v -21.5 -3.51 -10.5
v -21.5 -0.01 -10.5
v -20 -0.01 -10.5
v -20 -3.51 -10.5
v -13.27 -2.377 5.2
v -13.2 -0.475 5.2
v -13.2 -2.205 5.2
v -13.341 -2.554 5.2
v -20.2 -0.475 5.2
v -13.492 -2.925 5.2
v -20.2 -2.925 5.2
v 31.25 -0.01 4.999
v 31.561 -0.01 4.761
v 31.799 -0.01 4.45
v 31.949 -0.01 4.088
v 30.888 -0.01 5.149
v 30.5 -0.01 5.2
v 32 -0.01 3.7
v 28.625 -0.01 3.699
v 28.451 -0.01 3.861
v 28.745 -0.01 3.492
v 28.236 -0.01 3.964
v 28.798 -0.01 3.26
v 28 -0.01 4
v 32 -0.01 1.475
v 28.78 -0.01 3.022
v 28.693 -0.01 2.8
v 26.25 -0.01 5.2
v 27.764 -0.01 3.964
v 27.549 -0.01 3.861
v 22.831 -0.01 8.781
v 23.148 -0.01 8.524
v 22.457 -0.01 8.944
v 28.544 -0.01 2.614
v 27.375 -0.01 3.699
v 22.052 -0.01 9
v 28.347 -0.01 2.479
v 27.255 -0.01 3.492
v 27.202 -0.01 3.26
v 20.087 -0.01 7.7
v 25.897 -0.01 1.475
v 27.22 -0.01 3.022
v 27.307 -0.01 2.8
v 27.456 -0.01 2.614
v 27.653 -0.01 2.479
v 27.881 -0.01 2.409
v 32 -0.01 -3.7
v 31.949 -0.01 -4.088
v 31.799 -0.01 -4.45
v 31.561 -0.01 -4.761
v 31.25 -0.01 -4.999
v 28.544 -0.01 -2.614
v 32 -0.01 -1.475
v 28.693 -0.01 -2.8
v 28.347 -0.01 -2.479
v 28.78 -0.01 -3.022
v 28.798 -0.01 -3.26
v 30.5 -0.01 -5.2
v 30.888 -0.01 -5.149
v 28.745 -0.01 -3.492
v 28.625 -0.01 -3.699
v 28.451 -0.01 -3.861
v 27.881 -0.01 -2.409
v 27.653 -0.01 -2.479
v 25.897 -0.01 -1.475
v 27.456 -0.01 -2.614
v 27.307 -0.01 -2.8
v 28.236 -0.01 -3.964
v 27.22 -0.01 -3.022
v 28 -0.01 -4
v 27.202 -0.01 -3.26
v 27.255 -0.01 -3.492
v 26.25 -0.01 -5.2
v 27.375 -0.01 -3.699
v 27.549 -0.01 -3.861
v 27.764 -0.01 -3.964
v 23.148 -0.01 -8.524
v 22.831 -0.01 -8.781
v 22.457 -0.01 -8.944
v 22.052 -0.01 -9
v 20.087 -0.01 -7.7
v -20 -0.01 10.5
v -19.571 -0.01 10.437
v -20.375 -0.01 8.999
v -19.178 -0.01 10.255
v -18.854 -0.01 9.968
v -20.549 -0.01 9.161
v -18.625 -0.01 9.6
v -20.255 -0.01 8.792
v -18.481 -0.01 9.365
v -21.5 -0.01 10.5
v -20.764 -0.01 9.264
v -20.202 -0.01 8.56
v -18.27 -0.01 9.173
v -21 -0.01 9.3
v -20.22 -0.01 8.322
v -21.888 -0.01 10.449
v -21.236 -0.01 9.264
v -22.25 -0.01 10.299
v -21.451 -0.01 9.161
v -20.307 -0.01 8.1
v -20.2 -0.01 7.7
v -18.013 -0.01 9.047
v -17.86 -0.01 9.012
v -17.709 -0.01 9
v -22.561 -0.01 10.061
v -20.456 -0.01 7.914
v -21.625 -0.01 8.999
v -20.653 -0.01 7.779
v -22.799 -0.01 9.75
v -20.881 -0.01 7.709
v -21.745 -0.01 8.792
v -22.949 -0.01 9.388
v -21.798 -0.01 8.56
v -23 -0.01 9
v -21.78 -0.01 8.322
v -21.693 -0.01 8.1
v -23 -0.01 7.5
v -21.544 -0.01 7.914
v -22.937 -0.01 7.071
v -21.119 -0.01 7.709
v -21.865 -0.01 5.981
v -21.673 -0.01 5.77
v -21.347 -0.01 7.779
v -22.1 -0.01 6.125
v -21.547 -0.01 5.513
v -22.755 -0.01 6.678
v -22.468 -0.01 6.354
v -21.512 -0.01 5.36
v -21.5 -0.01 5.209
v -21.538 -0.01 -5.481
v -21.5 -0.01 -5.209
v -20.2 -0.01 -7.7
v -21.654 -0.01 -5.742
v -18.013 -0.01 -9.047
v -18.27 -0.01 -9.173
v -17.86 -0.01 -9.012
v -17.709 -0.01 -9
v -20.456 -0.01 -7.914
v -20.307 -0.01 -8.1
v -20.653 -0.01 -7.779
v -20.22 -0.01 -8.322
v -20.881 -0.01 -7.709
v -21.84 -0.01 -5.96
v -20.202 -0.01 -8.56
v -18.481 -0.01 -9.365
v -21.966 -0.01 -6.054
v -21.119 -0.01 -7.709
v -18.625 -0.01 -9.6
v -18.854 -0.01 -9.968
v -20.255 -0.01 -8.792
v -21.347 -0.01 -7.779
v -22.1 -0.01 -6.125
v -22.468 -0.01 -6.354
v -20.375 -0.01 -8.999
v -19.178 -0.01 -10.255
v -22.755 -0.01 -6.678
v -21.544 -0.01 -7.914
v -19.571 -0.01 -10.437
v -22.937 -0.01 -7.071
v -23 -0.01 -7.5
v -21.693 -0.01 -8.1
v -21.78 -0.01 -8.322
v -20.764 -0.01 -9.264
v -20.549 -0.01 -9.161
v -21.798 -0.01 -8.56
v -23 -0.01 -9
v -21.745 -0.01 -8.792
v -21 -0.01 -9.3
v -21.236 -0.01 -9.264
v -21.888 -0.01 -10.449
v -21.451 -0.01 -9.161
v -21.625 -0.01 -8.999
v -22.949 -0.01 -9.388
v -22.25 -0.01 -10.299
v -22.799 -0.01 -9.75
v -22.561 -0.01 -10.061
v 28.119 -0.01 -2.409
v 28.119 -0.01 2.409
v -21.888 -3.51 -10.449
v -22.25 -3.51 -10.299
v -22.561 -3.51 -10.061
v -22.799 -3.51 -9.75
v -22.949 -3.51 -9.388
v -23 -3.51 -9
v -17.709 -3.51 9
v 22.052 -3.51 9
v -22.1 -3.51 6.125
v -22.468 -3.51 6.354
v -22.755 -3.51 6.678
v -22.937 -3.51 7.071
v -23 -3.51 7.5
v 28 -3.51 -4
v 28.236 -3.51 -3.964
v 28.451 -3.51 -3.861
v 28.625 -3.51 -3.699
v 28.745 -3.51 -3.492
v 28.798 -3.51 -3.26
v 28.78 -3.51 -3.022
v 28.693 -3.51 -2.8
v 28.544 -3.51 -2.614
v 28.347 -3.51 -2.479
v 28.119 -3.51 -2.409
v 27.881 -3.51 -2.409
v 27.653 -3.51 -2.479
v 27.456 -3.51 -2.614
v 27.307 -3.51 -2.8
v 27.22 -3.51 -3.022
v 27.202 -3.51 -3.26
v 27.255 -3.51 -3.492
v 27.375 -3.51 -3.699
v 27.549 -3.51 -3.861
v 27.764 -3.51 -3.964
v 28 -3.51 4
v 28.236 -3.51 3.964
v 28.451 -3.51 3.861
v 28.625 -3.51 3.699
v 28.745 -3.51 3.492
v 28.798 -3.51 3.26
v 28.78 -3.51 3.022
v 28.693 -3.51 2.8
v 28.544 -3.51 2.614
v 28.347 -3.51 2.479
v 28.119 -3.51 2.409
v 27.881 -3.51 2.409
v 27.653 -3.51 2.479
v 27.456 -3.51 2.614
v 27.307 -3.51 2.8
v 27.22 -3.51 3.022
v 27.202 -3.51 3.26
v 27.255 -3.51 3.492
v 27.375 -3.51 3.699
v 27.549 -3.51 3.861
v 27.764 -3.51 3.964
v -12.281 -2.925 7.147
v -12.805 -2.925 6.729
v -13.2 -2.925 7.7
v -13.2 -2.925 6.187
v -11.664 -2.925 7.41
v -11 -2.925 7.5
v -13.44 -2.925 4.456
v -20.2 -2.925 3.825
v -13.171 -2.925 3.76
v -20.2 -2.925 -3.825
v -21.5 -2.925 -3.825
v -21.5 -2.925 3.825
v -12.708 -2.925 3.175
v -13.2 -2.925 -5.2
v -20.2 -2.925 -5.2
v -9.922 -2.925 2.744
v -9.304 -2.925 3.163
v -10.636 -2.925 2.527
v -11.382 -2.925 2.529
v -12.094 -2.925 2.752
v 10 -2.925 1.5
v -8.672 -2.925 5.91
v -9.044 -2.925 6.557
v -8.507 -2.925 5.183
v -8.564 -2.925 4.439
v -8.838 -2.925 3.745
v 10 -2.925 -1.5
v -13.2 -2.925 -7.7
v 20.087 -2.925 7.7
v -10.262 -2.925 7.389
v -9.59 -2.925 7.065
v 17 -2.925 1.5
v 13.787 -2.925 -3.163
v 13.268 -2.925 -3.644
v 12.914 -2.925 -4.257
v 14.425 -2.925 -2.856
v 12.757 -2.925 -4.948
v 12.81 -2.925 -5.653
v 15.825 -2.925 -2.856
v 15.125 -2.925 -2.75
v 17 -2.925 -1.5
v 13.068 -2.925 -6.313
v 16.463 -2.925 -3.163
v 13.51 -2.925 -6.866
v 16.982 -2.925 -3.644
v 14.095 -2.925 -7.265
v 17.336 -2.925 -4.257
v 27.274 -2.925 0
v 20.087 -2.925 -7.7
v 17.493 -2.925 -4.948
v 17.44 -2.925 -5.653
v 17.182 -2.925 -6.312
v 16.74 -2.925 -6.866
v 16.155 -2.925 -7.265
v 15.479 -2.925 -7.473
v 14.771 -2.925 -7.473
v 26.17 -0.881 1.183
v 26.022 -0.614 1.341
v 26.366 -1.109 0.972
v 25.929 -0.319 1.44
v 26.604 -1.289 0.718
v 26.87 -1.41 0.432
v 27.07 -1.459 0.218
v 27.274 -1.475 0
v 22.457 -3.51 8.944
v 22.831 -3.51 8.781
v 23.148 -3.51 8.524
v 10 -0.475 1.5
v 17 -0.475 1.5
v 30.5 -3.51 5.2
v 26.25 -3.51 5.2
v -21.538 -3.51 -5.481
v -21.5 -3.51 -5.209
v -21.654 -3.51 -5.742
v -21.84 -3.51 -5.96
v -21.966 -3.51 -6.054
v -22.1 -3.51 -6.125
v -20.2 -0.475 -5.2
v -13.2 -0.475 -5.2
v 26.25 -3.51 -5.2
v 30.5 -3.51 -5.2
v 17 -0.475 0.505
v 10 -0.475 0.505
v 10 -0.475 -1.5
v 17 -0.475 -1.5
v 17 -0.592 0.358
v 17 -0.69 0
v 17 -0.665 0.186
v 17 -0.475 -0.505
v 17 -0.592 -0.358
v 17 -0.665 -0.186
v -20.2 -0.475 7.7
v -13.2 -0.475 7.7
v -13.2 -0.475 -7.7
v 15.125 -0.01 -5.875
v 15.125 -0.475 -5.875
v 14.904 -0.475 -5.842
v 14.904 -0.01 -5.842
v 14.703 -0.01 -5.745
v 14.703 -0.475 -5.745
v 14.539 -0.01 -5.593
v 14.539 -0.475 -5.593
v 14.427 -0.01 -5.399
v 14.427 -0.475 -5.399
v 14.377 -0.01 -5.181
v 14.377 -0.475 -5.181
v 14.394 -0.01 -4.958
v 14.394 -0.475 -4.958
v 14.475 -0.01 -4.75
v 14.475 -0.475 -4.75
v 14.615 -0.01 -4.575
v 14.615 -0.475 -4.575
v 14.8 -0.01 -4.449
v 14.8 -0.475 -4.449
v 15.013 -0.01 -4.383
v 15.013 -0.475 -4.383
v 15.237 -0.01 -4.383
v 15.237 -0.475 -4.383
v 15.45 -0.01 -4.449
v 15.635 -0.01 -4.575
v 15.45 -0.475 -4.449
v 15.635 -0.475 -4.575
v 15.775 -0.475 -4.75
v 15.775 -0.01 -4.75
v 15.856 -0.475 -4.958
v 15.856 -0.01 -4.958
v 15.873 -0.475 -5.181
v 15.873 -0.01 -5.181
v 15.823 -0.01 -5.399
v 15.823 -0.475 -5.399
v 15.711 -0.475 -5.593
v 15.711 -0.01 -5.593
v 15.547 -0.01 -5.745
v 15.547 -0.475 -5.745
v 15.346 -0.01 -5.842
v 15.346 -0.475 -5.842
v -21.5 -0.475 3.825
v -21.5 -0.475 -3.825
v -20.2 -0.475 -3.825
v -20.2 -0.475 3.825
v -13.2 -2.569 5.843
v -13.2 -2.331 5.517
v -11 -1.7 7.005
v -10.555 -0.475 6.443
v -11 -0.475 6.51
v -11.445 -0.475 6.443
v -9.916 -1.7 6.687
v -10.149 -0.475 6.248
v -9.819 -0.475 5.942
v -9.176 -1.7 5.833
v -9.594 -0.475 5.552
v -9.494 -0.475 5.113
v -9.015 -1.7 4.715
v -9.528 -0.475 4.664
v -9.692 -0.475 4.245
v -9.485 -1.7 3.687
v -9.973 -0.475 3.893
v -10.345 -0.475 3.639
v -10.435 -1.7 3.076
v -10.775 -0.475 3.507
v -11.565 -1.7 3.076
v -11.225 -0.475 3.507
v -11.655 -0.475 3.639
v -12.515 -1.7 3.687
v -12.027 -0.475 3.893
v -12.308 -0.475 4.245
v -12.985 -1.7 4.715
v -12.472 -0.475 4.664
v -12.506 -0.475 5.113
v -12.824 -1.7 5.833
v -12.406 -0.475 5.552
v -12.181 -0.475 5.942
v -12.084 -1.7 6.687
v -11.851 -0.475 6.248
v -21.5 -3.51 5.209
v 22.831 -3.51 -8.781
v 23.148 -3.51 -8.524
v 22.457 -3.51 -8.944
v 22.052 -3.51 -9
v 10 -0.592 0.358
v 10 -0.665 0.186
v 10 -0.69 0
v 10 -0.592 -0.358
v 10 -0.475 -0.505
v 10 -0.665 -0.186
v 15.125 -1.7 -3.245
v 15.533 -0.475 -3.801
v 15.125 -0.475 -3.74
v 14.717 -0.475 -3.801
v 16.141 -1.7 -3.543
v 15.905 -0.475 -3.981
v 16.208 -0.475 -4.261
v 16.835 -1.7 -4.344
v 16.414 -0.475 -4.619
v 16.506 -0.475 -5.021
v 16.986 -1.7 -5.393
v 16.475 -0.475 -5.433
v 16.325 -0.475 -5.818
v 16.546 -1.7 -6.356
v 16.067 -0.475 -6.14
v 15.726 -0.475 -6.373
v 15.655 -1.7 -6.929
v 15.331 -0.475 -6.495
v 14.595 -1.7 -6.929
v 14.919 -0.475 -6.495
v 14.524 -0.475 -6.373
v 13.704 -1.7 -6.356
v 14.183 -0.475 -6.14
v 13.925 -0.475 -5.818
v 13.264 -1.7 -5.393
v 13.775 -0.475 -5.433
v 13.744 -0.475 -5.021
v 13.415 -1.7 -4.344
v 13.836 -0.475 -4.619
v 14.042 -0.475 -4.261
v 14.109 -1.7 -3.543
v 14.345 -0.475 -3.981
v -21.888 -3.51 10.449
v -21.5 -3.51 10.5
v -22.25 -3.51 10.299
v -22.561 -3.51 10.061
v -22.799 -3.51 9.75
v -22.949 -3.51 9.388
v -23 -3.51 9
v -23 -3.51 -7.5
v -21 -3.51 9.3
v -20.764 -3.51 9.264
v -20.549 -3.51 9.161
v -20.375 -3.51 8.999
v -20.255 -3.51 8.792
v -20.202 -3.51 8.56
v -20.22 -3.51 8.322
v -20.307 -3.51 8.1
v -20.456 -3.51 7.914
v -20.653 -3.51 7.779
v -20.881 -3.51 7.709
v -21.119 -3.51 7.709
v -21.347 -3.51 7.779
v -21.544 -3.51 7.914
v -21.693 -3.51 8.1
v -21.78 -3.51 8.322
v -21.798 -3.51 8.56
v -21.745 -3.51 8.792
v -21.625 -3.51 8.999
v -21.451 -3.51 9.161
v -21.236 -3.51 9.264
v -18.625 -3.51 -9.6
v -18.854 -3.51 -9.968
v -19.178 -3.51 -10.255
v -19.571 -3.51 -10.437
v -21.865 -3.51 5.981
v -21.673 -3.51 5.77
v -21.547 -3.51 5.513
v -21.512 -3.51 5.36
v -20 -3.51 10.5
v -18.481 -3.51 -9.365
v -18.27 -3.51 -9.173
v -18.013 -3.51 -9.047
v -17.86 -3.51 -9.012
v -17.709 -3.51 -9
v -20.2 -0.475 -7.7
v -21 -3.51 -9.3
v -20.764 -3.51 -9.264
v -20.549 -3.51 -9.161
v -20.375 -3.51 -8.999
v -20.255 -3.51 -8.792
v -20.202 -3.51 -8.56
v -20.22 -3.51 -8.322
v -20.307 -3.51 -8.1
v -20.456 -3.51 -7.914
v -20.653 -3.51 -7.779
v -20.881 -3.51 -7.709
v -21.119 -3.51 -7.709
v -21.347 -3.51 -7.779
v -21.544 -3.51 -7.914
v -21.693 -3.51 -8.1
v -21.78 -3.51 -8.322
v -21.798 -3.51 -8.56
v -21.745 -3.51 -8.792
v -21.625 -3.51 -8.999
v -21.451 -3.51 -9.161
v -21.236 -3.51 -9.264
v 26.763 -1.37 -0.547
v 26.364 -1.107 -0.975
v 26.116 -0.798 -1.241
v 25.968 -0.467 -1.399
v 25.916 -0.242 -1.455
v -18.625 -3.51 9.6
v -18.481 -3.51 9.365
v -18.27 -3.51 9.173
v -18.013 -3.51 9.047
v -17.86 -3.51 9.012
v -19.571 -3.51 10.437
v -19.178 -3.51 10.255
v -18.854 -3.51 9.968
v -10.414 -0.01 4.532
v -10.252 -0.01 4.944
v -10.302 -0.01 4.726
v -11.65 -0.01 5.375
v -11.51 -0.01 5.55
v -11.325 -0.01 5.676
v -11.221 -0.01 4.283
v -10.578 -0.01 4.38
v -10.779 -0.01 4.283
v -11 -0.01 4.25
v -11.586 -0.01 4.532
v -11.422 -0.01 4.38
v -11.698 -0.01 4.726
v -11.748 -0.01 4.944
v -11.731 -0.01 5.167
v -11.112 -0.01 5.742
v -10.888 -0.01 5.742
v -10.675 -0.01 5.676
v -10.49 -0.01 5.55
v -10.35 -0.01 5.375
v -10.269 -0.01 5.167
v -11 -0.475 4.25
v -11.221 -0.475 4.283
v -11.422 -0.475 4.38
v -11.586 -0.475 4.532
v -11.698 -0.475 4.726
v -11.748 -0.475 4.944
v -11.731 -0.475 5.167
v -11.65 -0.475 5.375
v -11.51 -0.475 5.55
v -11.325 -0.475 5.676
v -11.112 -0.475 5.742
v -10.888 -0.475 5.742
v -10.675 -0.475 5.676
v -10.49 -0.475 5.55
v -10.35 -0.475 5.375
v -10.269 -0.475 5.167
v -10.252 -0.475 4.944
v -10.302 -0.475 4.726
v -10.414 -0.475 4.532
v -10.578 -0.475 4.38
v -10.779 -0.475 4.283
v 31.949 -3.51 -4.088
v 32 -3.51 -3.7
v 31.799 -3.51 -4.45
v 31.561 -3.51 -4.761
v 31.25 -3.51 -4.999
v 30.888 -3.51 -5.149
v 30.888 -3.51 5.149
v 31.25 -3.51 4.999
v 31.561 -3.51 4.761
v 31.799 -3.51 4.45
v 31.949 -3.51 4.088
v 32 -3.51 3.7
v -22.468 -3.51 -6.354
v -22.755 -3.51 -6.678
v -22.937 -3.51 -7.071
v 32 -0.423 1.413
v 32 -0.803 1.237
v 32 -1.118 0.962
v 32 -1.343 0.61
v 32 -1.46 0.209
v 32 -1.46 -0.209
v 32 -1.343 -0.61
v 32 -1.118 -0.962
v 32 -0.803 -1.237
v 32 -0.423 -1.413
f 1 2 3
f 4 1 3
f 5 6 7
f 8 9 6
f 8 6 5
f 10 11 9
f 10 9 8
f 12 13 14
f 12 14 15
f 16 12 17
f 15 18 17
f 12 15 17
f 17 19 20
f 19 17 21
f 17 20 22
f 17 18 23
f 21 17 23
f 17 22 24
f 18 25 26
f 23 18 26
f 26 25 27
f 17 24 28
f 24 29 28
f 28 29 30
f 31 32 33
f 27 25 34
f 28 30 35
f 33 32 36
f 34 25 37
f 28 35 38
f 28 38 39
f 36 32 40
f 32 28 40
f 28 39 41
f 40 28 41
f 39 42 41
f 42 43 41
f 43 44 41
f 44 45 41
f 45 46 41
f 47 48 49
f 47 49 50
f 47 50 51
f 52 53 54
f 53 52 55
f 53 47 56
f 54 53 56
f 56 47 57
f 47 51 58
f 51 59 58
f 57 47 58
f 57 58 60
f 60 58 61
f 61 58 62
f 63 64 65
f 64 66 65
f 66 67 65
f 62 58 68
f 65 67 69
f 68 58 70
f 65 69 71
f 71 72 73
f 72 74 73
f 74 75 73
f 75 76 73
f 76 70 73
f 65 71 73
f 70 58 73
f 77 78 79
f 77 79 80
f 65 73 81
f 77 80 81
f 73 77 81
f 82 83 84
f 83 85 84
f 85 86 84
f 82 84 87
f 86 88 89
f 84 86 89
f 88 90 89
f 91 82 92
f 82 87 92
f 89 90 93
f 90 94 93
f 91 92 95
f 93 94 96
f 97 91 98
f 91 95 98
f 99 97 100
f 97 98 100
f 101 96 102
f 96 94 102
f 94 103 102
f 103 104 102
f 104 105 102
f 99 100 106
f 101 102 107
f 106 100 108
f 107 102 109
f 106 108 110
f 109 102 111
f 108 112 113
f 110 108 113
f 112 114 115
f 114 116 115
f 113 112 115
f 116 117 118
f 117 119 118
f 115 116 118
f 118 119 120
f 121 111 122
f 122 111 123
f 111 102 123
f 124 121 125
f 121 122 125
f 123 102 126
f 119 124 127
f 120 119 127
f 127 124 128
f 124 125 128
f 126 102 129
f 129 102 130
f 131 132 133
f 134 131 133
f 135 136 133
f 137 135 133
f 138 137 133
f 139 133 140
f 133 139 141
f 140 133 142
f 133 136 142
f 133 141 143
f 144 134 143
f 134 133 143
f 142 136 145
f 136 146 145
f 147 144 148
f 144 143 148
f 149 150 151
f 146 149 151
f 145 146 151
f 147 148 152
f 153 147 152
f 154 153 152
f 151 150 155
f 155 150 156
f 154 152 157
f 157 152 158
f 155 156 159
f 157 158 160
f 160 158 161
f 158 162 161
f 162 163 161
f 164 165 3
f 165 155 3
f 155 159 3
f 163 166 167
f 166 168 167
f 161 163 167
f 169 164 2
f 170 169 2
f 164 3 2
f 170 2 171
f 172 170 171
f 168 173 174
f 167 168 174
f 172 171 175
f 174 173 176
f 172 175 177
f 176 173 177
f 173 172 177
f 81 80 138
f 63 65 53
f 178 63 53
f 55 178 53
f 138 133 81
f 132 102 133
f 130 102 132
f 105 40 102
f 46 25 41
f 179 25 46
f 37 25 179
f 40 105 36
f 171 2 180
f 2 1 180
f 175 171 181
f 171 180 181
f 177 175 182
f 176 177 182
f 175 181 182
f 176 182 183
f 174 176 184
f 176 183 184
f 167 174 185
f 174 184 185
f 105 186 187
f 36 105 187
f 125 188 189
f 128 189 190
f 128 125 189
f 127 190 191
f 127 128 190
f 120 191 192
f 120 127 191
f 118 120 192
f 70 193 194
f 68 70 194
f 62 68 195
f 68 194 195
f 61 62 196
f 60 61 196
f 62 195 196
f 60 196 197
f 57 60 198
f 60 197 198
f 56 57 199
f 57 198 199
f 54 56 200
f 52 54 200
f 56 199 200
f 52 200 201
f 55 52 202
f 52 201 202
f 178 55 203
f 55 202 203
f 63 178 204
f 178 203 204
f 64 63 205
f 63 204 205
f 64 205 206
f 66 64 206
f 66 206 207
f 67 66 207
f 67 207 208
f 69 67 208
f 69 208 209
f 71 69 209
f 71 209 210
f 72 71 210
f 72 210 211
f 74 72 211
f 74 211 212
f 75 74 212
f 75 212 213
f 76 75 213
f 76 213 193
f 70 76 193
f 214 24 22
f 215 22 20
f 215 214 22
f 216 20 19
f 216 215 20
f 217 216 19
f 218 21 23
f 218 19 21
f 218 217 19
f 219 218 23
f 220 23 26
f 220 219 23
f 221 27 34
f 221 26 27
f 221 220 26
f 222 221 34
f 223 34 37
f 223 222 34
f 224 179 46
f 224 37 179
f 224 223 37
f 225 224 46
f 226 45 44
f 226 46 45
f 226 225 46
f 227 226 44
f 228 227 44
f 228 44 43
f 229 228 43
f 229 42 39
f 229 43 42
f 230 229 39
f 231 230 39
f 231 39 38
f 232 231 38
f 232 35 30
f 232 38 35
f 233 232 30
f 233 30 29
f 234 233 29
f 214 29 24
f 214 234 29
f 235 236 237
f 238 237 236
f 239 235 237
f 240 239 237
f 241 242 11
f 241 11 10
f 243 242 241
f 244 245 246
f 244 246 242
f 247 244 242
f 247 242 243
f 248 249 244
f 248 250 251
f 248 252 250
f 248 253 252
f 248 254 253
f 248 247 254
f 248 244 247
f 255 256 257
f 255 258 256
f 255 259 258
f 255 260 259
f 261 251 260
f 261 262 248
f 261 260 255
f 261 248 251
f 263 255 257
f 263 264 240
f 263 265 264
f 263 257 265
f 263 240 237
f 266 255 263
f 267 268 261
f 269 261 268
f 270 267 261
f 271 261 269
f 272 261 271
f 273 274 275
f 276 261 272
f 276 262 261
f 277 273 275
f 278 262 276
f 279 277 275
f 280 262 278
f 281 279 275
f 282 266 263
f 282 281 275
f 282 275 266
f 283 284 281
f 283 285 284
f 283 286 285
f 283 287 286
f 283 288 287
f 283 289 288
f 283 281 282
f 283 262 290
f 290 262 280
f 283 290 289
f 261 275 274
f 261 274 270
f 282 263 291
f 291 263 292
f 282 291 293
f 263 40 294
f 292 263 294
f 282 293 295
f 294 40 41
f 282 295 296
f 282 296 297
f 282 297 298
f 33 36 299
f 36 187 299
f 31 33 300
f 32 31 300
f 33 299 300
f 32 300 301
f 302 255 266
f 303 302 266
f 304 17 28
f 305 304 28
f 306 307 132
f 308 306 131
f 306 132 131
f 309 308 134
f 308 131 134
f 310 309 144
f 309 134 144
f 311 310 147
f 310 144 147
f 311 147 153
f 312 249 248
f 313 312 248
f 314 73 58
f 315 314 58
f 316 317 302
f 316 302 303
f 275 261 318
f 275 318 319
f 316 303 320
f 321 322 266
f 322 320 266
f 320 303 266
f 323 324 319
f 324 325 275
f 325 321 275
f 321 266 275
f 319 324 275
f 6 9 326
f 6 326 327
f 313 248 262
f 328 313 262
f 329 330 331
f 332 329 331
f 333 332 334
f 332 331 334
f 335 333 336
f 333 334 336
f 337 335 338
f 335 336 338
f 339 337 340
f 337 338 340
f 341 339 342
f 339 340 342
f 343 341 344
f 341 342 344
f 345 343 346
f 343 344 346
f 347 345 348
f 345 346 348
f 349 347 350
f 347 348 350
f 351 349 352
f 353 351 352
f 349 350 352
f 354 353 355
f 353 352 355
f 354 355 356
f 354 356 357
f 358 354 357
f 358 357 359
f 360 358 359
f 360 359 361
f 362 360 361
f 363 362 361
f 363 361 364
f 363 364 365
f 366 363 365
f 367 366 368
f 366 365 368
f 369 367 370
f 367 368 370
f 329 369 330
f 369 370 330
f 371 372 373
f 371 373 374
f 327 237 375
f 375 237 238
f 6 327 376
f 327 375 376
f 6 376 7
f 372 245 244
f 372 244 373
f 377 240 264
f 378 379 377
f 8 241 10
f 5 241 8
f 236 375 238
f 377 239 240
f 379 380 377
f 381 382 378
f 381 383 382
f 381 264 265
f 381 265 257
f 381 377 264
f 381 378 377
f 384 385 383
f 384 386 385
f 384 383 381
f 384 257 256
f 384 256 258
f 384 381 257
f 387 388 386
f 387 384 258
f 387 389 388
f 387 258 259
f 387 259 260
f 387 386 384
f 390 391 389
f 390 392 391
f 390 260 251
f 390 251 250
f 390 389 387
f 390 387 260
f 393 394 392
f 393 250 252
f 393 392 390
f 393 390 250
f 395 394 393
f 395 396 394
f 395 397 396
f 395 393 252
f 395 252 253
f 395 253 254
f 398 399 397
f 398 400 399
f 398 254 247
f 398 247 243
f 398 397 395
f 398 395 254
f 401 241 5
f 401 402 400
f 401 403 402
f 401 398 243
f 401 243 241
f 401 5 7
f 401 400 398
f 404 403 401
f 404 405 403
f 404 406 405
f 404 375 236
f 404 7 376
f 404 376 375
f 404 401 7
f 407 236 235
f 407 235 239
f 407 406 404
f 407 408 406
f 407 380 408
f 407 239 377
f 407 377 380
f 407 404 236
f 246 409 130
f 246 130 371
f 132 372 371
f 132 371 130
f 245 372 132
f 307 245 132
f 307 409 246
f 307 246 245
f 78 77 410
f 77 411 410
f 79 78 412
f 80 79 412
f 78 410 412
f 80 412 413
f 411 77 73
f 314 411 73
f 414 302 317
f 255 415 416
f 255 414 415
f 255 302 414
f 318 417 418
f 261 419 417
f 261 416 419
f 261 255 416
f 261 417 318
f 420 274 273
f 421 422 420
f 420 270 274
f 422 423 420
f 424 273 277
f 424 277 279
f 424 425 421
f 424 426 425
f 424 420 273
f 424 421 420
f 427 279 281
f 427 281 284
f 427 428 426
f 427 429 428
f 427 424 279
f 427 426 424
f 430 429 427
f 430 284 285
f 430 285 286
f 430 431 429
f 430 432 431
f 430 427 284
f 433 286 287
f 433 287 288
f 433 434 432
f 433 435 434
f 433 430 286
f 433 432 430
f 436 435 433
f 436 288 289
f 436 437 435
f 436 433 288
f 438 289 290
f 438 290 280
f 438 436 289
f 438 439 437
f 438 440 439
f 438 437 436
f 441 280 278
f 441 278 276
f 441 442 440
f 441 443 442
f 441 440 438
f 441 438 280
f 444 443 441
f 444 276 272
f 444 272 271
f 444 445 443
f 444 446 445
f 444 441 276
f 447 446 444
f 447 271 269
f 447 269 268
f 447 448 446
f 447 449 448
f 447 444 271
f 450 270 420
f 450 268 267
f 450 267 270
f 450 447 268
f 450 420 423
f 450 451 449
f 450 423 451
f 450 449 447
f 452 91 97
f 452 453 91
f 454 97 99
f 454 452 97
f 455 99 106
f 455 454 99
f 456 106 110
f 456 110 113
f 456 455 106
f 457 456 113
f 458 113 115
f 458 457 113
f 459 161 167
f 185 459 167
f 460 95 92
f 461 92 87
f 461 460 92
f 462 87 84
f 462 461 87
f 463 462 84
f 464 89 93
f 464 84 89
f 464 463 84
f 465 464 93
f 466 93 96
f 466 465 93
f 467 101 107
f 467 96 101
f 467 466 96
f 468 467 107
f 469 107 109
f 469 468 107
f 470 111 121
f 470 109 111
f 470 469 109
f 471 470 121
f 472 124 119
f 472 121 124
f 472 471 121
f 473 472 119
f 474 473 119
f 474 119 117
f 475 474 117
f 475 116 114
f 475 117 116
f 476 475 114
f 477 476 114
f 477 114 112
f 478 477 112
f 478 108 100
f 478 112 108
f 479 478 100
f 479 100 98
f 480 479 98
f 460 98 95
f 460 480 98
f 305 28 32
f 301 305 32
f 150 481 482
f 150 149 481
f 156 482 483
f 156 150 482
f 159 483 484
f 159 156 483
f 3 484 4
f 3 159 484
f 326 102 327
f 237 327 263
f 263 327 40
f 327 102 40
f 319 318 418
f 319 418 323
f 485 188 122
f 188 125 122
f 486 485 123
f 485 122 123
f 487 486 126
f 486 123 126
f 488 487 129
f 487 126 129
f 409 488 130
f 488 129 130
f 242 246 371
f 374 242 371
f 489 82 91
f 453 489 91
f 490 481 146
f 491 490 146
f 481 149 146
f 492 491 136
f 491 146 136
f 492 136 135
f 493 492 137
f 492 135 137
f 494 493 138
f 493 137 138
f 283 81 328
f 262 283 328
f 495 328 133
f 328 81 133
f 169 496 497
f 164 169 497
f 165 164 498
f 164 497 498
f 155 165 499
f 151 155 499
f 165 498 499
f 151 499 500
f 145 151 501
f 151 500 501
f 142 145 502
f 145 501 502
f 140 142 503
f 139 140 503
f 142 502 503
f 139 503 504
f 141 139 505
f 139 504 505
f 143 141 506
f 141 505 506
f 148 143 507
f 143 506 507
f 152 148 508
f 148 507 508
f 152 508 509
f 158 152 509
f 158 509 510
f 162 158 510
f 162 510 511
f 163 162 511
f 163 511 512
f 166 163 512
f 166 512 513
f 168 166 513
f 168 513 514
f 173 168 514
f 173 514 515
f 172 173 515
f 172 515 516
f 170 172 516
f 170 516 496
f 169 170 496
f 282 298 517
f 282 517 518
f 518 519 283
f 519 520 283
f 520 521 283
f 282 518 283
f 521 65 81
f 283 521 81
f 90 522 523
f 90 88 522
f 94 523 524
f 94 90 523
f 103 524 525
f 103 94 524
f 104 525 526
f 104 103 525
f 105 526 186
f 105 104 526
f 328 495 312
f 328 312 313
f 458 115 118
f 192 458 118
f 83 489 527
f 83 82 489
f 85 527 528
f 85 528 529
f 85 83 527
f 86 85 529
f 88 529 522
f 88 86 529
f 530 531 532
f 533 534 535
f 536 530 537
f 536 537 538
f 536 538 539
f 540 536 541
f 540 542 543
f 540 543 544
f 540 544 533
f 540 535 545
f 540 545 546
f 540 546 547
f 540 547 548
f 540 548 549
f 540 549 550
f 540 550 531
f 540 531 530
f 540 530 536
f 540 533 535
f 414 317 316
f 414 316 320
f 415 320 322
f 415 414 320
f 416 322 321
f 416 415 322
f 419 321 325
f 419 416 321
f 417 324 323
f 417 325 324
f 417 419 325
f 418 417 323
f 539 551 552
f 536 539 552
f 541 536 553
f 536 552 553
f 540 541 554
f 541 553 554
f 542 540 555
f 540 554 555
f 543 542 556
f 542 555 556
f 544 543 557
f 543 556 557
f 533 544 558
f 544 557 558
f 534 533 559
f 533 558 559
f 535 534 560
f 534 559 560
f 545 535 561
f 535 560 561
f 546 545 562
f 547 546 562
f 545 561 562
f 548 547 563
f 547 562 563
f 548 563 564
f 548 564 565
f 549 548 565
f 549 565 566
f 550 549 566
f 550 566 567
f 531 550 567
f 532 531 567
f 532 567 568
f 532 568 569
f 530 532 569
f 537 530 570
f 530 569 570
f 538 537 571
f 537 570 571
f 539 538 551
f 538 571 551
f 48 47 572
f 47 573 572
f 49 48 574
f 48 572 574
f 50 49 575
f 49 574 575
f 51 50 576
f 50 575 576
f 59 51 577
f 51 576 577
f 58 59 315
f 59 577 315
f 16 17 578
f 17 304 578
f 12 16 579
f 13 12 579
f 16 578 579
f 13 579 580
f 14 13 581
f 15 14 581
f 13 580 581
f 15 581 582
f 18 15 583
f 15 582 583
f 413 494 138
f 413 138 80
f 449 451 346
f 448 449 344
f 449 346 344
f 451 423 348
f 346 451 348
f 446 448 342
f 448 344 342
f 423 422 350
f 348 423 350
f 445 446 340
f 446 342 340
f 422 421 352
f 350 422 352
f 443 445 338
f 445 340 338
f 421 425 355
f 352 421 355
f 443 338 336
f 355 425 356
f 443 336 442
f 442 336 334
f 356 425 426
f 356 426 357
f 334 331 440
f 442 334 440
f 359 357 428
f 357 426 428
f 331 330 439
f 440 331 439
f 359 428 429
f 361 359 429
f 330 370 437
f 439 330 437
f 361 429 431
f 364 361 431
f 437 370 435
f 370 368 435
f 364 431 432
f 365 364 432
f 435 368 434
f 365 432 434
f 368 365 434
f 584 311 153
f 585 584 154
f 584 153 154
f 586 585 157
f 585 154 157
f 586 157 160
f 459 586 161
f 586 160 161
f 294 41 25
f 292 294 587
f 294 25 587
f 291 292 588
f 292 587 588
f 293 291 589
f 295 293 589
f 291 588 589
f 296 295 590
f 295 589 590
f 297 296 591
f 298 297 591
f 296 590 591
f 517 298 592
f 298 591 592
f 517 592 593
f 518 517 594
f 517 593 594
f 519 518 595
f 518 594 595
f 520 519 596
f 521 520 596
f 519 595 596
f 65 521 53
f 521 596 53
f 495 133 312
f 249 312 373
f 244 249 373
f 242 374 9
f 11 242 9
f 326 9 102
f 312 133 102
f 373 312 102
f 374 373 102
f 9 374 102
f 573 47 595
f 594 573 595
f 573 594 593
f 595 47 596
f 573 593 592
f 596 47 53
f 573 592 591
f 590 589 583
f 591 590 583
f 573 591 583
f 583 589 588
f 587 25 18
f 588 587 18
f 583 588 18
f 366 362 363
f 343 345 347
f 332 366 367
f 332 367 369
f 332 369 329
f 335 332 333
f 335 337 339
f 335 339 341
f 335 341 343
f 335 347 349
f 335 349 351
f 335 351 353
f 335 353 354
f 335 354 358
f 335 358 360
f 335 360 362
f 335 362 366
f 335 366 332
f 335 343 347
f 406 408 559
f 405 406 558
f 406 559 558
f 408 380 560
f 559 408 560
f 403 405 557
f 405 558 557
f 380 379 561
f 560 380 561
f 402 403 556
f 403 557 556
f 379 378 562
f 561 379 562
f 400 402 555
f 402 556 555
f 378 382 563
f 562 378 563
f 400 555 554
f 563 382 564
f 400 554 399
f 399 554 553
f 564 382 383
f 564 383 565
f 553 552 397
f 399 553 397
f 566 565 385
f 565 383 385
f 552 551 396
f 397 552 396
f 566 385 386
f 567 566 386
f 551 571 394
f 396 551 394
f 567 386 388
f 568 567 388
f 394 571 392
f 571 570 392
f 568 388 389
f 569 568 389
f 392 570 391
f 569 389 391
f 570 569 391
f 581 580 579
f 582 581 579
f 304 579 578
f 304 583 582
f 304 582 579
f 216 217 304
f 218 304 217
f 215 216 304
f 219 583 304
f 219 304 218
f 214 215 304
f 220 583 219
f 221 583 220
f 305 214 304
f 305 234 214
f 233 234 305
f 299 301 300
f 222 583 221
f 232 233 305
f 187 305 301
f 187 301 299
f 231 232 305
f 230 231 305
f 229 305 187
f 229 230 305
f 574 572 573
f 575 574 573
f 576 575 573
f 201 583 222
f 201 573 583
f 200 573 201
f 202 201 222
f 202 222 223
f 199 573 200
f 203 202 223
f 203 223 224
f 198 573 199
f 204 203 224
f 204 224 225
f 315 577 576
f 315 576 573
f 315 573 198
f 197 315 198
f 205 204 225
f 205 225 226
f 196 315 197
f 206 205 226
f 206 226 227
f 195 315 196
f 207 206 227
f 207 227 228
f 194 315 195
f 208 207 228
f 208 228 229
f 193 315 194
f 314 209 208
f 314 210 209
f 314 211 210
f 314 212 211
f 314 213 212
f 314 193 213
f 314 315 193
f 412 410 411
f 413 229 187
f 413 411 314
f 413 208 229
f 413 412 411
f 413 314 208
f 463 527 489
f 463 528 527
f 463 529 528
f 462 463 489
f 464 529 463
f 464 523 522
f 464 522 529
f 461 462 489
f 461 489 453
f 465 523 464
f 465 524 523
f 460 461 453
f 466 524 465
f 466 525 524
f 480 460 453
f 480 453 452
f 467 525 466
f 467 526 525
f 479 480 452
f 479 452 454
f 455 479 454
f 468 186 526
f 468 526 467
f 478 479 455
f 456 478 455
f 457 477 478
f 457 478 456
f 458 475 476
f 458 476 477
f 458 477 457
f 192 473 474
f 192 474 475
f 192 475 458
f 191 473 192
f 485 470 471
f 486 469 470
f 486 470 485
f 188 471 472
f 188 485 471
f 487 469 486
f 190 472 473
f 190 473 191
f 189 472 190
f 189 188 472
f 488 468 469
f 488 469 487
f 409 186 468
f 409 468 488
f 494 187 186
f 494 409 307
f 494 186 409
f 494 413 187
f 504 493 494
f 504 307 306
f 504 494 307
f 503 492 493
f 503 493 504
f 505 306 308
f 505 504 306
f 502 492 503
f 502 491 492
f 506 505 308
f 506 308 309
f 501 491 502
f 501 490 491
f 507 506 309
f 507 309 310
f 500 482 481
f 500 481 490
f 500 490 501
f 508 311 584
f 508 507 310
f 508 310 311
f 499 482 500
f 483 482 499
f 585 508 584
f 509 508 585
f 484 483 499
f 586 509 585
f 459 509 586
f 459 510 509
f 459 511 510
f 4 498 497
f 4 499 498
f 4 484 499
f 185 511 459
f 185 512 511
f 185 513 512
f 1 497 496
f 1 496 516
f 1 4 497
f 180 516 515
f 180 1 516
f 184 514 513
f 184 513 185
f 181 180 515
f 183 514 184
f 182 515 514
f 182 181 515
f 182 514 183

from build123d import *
from OCP.BRepFilletAPI import BRepFilletAPI_MakeChamfer

# Parameters (mm, degrees)
BOSS_EXTRUDE1_START      = -0.01
BOSS_EXTRUDE1_DEPTH      = 3.5
CUT_EXTRUDE1_DEPTH       = 2.925
SKETCH5_R                = 1.5
SKETCH5_R_2              = 1.375
SKETCH5_W                = 7
SKETCH5_H                = 2.5
SKETCH5_H_2              = 3
BOSS_EXTRUDE2_DEPTH      = 2.45
CHAMFER1_SIZE            = 1
CHAMFER1_SIZE_2          = 2.475086853
SKETCH15_R               = 0.75
BOSS_EXTRUDE5_DEPTH      = 0.465
SKETCH7_W                = 7.65
SKETCH7_H                = 2.45
CUT_EXTRUDE2_DEPTH       = 3
BOSS_EXTRUDE3_START      = 0.01
BOSS_EXTRUDE3_DEPTH      = 3.465
CUT_EXTRUDE3_DEPTH       = 2.475
SKETCH10_R               = 1.5
SKETCH10_R_2             = 1.375
BOSS_EXTRUDE4_DEPTH      = 2
CHAMFER2_SIZE            = 0.5
CHAMFER2_SIZE_2          = 2
BOSS_EXTRUDE6_START      = 2.95
SKETCH10_3_R             = 0.75
BOSS_EXTRUDE6_DEPTH      = 2.95
SKETCH21_W               = 2
SKETCH21_H               = 15.4
BOSS_EXTRUDE7_DEPTH      = 2
CUT_EXTRUDE6_START       = -3.465
SKETCH16_R               = 1
CUT_EXTRUDE6_DEPTH       = 38.860351794
SKETCH19_R               = 0.8
CUT_EXTRUDE9_DEPTH       = 35.395351794
SKETCH17_R               = 1.85
CUT_EXTRUDE7_DEPTH       = 2
SKETCH12_W               = 5
SKETCH12_H               = 4.8
CUT_EXTRUDE4_DEPTH       = 1
SKETCH13_R               = 1.475
CUT_EXTRUDE5_DEPTH       = 11.91309
CUT_EXTRUDE10_START      = -23
CUT_EXTRUDE10_DEPTH      = 9
CUT_EXTRUDE10_START_2    = -13.91308954
CUT_EXTRUDE10_2_DEPTH    = 2
CUT_EXTRUDE11_DEPTH      = 35.395351794
CUT_EXTRUDE11_DEPTH_BACK = 35.395351794
SKETCH22_W               = 1.5
SKETCH22_H               = 12
SKETCH22_W_2             = 43.847191308
SKETCH22_H_2             = 1.5
FILLET1_R                = 1.5
FILLET2_R                = 1.5
FILLET3_R                = 1
FILLET4_R                = 1


with BuildPart() as part:
    # Sketch2 → Boss-Extrude1 (new body)
    with BuildSketch(Plane(origin=(0, 0, 0), x_dir=(1, 0, 0), z_dir=(0, 1, 0)).offset(BOSS_EXTRUDE1_START)):
        Polygon((-23, 10.5), (21.303656906, 10.5), (26.250323572, 5.2), (32, 5.2), (32, -5.2), (26.250323572, -5.2), (21.303656906, -10.5), (-23, -10.5), align=None)
    extrude(amount=-BOSS_EXTRUDE1_DEPTH)

    # Sketch3 → Cut-Extrude1 (cut)
    with BuildSketch(Plane(origin=(0, 0, 0), x_dir=(1, 0, 0), z_dir=(0, 1, 0))):
        Polygon((-20.2, 7.7), (-20.2, -7.7), (20.08691046, -7.7), (27.273577127, 0), (20.08691046, 7.7), align=None)
    extrude(amount=-CUT_EXTRUDE1_DEPTH, mode=Mode.SUBTRACT)

    # Sketch5 → Boss-Extrude2 (add)
    with BuildSketch(Plane(origin=(0, -2.925, 0), x_dir=(1, 0, 0), z_dir=(0, 1, 0))):
        with Locations(Location((-11, -5, 0), (0, 0, 270))):
            Circle(SKETCH5_R)
        with Locations(Location((15.125, 5.125, 0), (0, 0, 270))):
            Circle(SKETCH5_R_2)
        with Locations((-16.7, -6.45)):
            Rectangle(SKETCH5_W, SKETCH5_H)
        with Locations((-16.7, 6.45)):
            Rectangle(SKETCH5_W, SKETCH5_H)
        with Locations((13.5, 0)):
            Rectangle(SKETCH5_W, SKETCH5_H_2)
    extrude(amount=BOSS_EXTRUDE2_DEPTH)

    # Chamfer1
    # the kernel refuses this chamfer: 2.475086853, 1 mm, written as the material it adds along each edge
    with BuildSketch(Plane(origin=(-11, -2.925, 5), x_dir=(0, 0, 1), z_dir=(-1, 0, 0))) as chamfer1_piece_1_section:
        Polygon((1.5 + CHAMFER1_SIZE, 0), (1.5, CHAMFER1_SIZE_2), (1.5, 0), align=None)
    chamfer1_piece_1 = revolve(axis=Axis((-11, -2.925, 5), (0, 1, 0)), mode=Mode.PRIVATE)
    chamfer1_piece_1 = split(chamfer1_piece_1, bisect_by=Plane(origin=(-11, -0.475, 5), z_dir=(0, -1, 0)), keep=Keep.TOP, mode=Mode.PRIVATE)
    add(chamfer1_piece_1)
    with BuildSketch(Plane(origin=(15.125, -2.925, -5.125), x_dir=(0, 0, 1), z_dir=(-1, 0, 0))) as chamfer1_piece_2_section:
        Polygon((1.375 + CHAMFER1_SIZE, 0), (1.375, CHAMFER1_SIZE_2), (1.375, 0), align=None)
    chamfer1_piece_2 = revolve(axis=Axis((15.125, -2.925, -5.125), (0, 1, 0)), mode=Mode.PRIVATE)
    chamfer1_piece_2 = split(chamfer1_piece_2, bisect_by=Plane(origin=(15.125, -0.475, -5.125), z_dir=(0, -1, 0)), keep=Keep.TOP, mode=Mode.PRIVATE)
    add(chamfer1_piece_2)

    # Sketch15 → Boss-Extrude5 (add)
    with BuildSketch(Plane(origin=(0, -0.475, 0), x_dir=(1, 0, 0), z_dir=(0, 1, 0))):
        with Locations(Location((-11, -5, 0), (0, 0, 90))):
            Circle(SKETCH15_R)
        with Locations(Location((15.125, 5.125, 0), (0, 0, 90))):
            Circle(SKETCH15_R)
    extrude(amount=BOSS_EXTRUDE5_DEPTH)

    # Sketch7 → Cut-Extrude2 (cut)
    with BuildSketch(Plane.ZY.offset(23)):
        with Locations((0, -1.7)):
            Rectangle(SKETCH7_W, SKETCH7_H)
    extrude(amount=-CUT_EXTRUDE2_DEPTH, mode=Mode.SUBTRACT)

    # Sketch19 → Cut-Extrude9 (cut, through all)
    with BuildSketch(Plane.XZ.offset(3.51)):
        with Locations(Location((-21, -8.5, 0), (0, 0, 270))):
            Circle(SKETCH19_R)
        with Locations(Location((28, -3.2, 0), (0, 0, 270))):
            Circle(SKETCH19_R)
    cut_extrude9 = extrude(amount=-CUT_EXTRUDE9_DEPTH, mode=Mode.SUBTRACT)


with BuildPart() as body_2:
    # Sketch2<2> → Boss-Extrude3 (new body)
    with BuildSketch(Plane(origin=(0, 0, 0), x_dir=(1, 0, 0), z_dir=(0, 1, 0)).offset(BOSS_EXTRUDE3_START)):
        Polygon((-23, 10.5), (21.303656906, 10.5), (26.250323572, 5.2), (32, 5.2), (32, -5.2), (26.250323572, -5.2), (21.303656906, -10.5), (-23, -10.5), align=None)
    extrude(amount=BOSS_EXTRUDE3_DEPTH)

    # Sketch3<2> → Cut-Extrude3 (cut)
    with BuildSketch(Plane(origin=(0, 0, 0), x_dir=(1, 0, 0), z_dir=(0, 1, 0))):
        Polygon((-20.2, 7.7), (-20.2, -7.7), (20.08691046, -7.7), (27.273577127, 0), (20.08691046, 7.7), align=None)
    extrude(amount=CUT_EXTRUDE3_DEPTH, mode=Mode.SUBTRACT)

    # Sketch10 → Boss-Extrude4 (add)
    with BuildSketch(Plane.XZ.offset(-2.475)):
        with Locations(Location((-11, 5, 0), (0, 0, 270))):
            Circle(SKETCH10_R)
        with Locations(Location((15.125, -5.125, 0), (0, 0, 270))):
            Circle(SKETCH10_R_2)
    extrude(amount=BOSS_EXTRUDE4_DEPTH)

    # Chamfer2
    chamfer2_edges_1 = [body_2.edges().sort_by_distance(p)[0] for p in [
        (-11, 2.475, 6.5),
    ]]
    chamfer2_side_1 = [body_2.faces().sort_by_distance(p)[0] for p in [
        (-11, 2.475, 6.51),
    ]]
    chamfer2_edges_2 = [body_2.edges().sort_by_distance(p)[0] for p in [
        (15.125, 2.475, -3.75),
    ]]
    chamfer2_side_2 = [body_2.faces().sort_by_distance(p)[0] for p in [
        (15.125, 2.475, -3.74),
    ]]
    chamfer2 = BRepFilletAPI_MakeChamfer(body_2.part.solid().wrapped)
    for e in chamfer2_edges_1:
        chamfer2.Add(CHAMFER2_SIZE - 0.0001, CHAMFER2_SIZE_2 - 0.0001, e.wrapped, chamfer2_side_1[0].wrapped)
    for e in chamfer2_edges_2:
        chamfer2.Add(CHAMFER2_SIZE - 0.0001, CHAMFER2_SIZE_2 - 0.0001, e.wrapped, chamfer2_side_2[0].wrapped)
    add(Compound.cast(chamfer2.Shape()), mode=Mode.REPLACE)  # a hair under: the kernel refuses the full size

    # Sketch10<3> → Boss-Extrude6 (add)
    with BuildSketch(Plane.XZ.offset(-2.475).offset(BOSS_EXTRUDE6_START)):
        with Locations(Location((-11, 5, 0), (0, 0, 270))):
            Circle(SKETCH10_3_R)
        with Locations(Location((15.125, -5.125, 0), (0, 0, 270))):
            Circle(SKETCH10_3_R)
    extrude(amount=-BOSS_EXTRUDE6_DEPTH)

    # Sketch21 → Boss-Extrude7 (add)
    with BuildSketch(Plane.XZ.offset(-2.475)):
        Polygon((-20.2, 7.7), (-18.2, 7.7), (-18.2, 2), (-14.2, 2), (-14.2, -2), (-18.2, -2), (-18.2, -7.7), (-20.2, -7.7), align=None)
        with Locations((19.08691046, 0)):
            Rectangle(SKETCH21_W, SKETCH21_H)
    extrude(amount=BOSS_EXTRUDE7_DEPTH)

    # Sketch16 → Cut-Extrude6 (cut)
    with BuildSketch(Plane(origin=(0, 3.475, 0), x_dir=(1, 0, 0), z_dir=(0, 1, 0)).offset(CUT_EXTRUDE6_START)):
        with Locations(Location((-21, 8.5, 0), (0, 0, 90))):
            Circle(SKETCH16_R)
        with Locations(Location((28, 3.2, 0), (0, 0, 90))):
            Circle(SKETCH16_R)
    cut_extrude6 = extrude(amount=CUT_EXTRUDE6_DEPTH, mode=Mode.SUBTRACT)

    # Sketch17 → Cut-Extrude7 (cut)
    with BuildSketch(Plane(origin=(0, 3.475, 0), x_dir=(1, 0, 0), z_dir=(0, 1, 0))):
        with Locations(Location((-21, 8.5, 0), (0, 0, 270))):
            Circle(SKETCH17_R)
        with Locations(Location((28, 3.2, 0), (0, 0, 270))):
            Circle(SKETCH17_R)
    cut_extrude7 = extrude(amount=-CUT_EXTRUDE7_DEPTH, mode=Mode.SUBTRACT)


with BuildPart() as mirror2_tool:
    # Mirror2: Cut-Extrude6, Cut-Extrude9, Cut-Extrude7 across plane
    add(cut_extrude6.mirror(Plane.XY))
    add(cut_extrude9.mirror(Plane.XY))
    add(cut_extrude7.mirror(Plane.XY))


with BuildPart() as part_1:
    add(part.part)

    # Mirror2: cut by mirror2_tool
    add(mirror2_tool.part, mode=Mode.SUBTRACT)


with BuildPart() as body_2_1:
    add(body_2.part)

    # Mirror2: cut by mirror2_tool
    add(mirror2_tool.part, mode=Mode.SUBTRACT)

    # Sketch12 → Cut-Extrude4 (cut)
    with BuildSketch(Plane(origin=(0, 3.475, 0), x_dir=(1, 0, 0), z_dir=(0, 1, 0))):
        with Locations((-9.5, -0.5)):
            Rectangle(SKETCH12_W, SKETCH12_H)
    extrude(amount=-CUT_EXTRUDE4_DEPTH, mode=Mode.SUBTRACT)


with BuildPart() as cut_extrude5_tool:
    # Sketch13 → Cut-Extrude5 (new body)
    with BuildSketch(Plane(origin=(32, 0, 0), x_dir=(0, 0, -1), z_dir=(1, 0, 0))):
        Circle(SKETCH13_R)
    extrude(amount=-CUT_EXTRUDE5_DEPTH)


with BuildPart() as part_2:
    add(part_1.part)

    # Cut-Extrude5: cut by cut_extrude5_tool
    add(cut_extrude5_tool.part, mode=Mode.SUBTRACT)

    # Cut-Extrude10: read off the stored shape, not the designer's step
    # Cut-Extrude10 outline → Cut-Extrude10 (cut)
    with BuildSketch(Plane(origin=(32, 0, 0), x_dir=(0, 0, -1), z_dir=(1, 0, 0)).offset(CUT_EXTRUDE10_START)):
        with BuildLine():
            Line((0.504752415, -0.475), (-0.504752415, -0.475))
            ThreePointArc((-0.504752415, -0.475), (0, -0.69), (0.504752415, -0.475))
        make_face()
    extrude(amount=CUT_EXTRUDE10_DEPTH, mode=Mode.SUBTRACT)


with BuildPart() as body_2_2:
    add(body_2_1.part)

    # Cut-Extrude5: cut by cut_extrude5_tool
    add(cut_extrude5_tool.part, mode=Mode.SUBTRACT)

    # Cut-Extrude10 2 outline → Cut-Extrude10 2 (cut)
    with BuildSketch(Plane(origin=(32, 0, 0), x_dir=(0, 0, -1), z_dir=(1, 0, 0)).offset(CUT_EXTRUDE10_START_2)):
        with BuildLine():
            Line((-0.523235129, 0.475), (0.523235129, 0.475))
            ThreePointArc((0.523235129, 0.475), (0, 0.71), (-0.523235129, 0.475))
        make_face()
    extrude(amount=CUT_EXTRUDE10_2_DEPTH, mode=Mode.SUBTRACT)


with BuildPart() as cut_extrude11_tool:
    # Sketch22 → Cut-Extrude11 (new, two sides: drawn at the far end of the back side and taken through both)
    with BuildSketch(Plane(origin=(0, 3.475, 0), x_dir=(1, 0, 0), z_dir=(0, 1, 0)).offset(-CUT_EXTRUDE11_DEPTH_BACK)):
        with Locations((-22.25, 0)):
            Rectangle(SKETCH22_W, SKETCH22_H)
        with Locations((3.423595654, 9.75)):
            Rectangle(SKETCH22_W_2, SKETCH22_H_2)
        with Locations((3.423595654, -9.75)):
            Rectangle(SKETCH22_W_2, SKETCH22_H_2)
    extrude(amount=CUT_EXTRUDE11_DEPTH + CUT_EXTRUDE11_DEPTH_BACK)


with BuildPart() as part_3:
    add(part_2.part)

    # Cut-Extrude11: cut by cut_extrude11_tool
    add(cut_extrude11_tool.part, mode=Mode.SUBTRACT)

    # Fillet2
    fillet2_edges = [part_3.edges().sort_by_distance(p)[0] for p in [
        (-18.5, -1.76, -10.5),
        (-18.5, -1.76, 10.5),
        (-23, -1.76, -6),
        (-23, -1.76, 10.5),
        (32, -1.76, 5.2),
        (-23, -1.76, 6),
        (-23, -1.76, -10.5),
        (32, -1.76, -5.2),
        (22.703656906, -1.76, 9),
        (22.703656906, -1.76, -9),
    ]]
    fillet(fillet2_edges, radius=FILLET2_R - 0.0001)  # a hair under: the kernel refuses the full size

    # Fillet4
    fillet4_edges = [part_3.edges().sort_by_distance(p)[0] for p in [
        (-21.5, -1.76, 6),
        (-21.5, -1.76, -6),
        (-18.5, -1.76, -9),
        (-18.5, -1.76, 9),
    ]]
    fillet(fillet4_edges, radius=FILLET4_R)


with BuildPart() as body_2_3:
    add(body_2_2.part)

    # Cut-Extrude11: cut by cut_extrude11_tool
    add(cut_extrude11_tool.part, mode=Mode.SUBTRACT)

    # Fillet1
    fillet1_edges = [body_2_3.edges().sort_by_distance(p)[0] for p in [
        (-23, 1.7425, -10.5),
        (-23, 1.7425, -6),
        (32, 1.7425, -5.2),
        (32, 1.7425, 5.2),
        (-18.5, 1.7425, 10.5),
        (-23, 1.7425, 6),
        (-23, 1.7425, 10.5),
        (-18.5, 1.7425, -10.5),
        (22.703656906, 1.7425, -9),
        (22.703656906, 1.7425, 9),
    ]]
    fillet(fillet1_edges, radius=FILLET1_R - 0.0001)  # a hair under: the kernel refuses the full size

    # Fillet3
    fillet3_edges = [body_2_3.edges().sort_by_distance(p)[0] for p in [
        (-21.5, 1.7425, -6),
        (-21.5, 1.7425, 6),
        (-18.5, 1.7425, -9),
        (-18.5, 1.7425, 9),
    ]]
    fillet(fillet3_edges, radius=FILLET3_R)


solid = part_3.part
